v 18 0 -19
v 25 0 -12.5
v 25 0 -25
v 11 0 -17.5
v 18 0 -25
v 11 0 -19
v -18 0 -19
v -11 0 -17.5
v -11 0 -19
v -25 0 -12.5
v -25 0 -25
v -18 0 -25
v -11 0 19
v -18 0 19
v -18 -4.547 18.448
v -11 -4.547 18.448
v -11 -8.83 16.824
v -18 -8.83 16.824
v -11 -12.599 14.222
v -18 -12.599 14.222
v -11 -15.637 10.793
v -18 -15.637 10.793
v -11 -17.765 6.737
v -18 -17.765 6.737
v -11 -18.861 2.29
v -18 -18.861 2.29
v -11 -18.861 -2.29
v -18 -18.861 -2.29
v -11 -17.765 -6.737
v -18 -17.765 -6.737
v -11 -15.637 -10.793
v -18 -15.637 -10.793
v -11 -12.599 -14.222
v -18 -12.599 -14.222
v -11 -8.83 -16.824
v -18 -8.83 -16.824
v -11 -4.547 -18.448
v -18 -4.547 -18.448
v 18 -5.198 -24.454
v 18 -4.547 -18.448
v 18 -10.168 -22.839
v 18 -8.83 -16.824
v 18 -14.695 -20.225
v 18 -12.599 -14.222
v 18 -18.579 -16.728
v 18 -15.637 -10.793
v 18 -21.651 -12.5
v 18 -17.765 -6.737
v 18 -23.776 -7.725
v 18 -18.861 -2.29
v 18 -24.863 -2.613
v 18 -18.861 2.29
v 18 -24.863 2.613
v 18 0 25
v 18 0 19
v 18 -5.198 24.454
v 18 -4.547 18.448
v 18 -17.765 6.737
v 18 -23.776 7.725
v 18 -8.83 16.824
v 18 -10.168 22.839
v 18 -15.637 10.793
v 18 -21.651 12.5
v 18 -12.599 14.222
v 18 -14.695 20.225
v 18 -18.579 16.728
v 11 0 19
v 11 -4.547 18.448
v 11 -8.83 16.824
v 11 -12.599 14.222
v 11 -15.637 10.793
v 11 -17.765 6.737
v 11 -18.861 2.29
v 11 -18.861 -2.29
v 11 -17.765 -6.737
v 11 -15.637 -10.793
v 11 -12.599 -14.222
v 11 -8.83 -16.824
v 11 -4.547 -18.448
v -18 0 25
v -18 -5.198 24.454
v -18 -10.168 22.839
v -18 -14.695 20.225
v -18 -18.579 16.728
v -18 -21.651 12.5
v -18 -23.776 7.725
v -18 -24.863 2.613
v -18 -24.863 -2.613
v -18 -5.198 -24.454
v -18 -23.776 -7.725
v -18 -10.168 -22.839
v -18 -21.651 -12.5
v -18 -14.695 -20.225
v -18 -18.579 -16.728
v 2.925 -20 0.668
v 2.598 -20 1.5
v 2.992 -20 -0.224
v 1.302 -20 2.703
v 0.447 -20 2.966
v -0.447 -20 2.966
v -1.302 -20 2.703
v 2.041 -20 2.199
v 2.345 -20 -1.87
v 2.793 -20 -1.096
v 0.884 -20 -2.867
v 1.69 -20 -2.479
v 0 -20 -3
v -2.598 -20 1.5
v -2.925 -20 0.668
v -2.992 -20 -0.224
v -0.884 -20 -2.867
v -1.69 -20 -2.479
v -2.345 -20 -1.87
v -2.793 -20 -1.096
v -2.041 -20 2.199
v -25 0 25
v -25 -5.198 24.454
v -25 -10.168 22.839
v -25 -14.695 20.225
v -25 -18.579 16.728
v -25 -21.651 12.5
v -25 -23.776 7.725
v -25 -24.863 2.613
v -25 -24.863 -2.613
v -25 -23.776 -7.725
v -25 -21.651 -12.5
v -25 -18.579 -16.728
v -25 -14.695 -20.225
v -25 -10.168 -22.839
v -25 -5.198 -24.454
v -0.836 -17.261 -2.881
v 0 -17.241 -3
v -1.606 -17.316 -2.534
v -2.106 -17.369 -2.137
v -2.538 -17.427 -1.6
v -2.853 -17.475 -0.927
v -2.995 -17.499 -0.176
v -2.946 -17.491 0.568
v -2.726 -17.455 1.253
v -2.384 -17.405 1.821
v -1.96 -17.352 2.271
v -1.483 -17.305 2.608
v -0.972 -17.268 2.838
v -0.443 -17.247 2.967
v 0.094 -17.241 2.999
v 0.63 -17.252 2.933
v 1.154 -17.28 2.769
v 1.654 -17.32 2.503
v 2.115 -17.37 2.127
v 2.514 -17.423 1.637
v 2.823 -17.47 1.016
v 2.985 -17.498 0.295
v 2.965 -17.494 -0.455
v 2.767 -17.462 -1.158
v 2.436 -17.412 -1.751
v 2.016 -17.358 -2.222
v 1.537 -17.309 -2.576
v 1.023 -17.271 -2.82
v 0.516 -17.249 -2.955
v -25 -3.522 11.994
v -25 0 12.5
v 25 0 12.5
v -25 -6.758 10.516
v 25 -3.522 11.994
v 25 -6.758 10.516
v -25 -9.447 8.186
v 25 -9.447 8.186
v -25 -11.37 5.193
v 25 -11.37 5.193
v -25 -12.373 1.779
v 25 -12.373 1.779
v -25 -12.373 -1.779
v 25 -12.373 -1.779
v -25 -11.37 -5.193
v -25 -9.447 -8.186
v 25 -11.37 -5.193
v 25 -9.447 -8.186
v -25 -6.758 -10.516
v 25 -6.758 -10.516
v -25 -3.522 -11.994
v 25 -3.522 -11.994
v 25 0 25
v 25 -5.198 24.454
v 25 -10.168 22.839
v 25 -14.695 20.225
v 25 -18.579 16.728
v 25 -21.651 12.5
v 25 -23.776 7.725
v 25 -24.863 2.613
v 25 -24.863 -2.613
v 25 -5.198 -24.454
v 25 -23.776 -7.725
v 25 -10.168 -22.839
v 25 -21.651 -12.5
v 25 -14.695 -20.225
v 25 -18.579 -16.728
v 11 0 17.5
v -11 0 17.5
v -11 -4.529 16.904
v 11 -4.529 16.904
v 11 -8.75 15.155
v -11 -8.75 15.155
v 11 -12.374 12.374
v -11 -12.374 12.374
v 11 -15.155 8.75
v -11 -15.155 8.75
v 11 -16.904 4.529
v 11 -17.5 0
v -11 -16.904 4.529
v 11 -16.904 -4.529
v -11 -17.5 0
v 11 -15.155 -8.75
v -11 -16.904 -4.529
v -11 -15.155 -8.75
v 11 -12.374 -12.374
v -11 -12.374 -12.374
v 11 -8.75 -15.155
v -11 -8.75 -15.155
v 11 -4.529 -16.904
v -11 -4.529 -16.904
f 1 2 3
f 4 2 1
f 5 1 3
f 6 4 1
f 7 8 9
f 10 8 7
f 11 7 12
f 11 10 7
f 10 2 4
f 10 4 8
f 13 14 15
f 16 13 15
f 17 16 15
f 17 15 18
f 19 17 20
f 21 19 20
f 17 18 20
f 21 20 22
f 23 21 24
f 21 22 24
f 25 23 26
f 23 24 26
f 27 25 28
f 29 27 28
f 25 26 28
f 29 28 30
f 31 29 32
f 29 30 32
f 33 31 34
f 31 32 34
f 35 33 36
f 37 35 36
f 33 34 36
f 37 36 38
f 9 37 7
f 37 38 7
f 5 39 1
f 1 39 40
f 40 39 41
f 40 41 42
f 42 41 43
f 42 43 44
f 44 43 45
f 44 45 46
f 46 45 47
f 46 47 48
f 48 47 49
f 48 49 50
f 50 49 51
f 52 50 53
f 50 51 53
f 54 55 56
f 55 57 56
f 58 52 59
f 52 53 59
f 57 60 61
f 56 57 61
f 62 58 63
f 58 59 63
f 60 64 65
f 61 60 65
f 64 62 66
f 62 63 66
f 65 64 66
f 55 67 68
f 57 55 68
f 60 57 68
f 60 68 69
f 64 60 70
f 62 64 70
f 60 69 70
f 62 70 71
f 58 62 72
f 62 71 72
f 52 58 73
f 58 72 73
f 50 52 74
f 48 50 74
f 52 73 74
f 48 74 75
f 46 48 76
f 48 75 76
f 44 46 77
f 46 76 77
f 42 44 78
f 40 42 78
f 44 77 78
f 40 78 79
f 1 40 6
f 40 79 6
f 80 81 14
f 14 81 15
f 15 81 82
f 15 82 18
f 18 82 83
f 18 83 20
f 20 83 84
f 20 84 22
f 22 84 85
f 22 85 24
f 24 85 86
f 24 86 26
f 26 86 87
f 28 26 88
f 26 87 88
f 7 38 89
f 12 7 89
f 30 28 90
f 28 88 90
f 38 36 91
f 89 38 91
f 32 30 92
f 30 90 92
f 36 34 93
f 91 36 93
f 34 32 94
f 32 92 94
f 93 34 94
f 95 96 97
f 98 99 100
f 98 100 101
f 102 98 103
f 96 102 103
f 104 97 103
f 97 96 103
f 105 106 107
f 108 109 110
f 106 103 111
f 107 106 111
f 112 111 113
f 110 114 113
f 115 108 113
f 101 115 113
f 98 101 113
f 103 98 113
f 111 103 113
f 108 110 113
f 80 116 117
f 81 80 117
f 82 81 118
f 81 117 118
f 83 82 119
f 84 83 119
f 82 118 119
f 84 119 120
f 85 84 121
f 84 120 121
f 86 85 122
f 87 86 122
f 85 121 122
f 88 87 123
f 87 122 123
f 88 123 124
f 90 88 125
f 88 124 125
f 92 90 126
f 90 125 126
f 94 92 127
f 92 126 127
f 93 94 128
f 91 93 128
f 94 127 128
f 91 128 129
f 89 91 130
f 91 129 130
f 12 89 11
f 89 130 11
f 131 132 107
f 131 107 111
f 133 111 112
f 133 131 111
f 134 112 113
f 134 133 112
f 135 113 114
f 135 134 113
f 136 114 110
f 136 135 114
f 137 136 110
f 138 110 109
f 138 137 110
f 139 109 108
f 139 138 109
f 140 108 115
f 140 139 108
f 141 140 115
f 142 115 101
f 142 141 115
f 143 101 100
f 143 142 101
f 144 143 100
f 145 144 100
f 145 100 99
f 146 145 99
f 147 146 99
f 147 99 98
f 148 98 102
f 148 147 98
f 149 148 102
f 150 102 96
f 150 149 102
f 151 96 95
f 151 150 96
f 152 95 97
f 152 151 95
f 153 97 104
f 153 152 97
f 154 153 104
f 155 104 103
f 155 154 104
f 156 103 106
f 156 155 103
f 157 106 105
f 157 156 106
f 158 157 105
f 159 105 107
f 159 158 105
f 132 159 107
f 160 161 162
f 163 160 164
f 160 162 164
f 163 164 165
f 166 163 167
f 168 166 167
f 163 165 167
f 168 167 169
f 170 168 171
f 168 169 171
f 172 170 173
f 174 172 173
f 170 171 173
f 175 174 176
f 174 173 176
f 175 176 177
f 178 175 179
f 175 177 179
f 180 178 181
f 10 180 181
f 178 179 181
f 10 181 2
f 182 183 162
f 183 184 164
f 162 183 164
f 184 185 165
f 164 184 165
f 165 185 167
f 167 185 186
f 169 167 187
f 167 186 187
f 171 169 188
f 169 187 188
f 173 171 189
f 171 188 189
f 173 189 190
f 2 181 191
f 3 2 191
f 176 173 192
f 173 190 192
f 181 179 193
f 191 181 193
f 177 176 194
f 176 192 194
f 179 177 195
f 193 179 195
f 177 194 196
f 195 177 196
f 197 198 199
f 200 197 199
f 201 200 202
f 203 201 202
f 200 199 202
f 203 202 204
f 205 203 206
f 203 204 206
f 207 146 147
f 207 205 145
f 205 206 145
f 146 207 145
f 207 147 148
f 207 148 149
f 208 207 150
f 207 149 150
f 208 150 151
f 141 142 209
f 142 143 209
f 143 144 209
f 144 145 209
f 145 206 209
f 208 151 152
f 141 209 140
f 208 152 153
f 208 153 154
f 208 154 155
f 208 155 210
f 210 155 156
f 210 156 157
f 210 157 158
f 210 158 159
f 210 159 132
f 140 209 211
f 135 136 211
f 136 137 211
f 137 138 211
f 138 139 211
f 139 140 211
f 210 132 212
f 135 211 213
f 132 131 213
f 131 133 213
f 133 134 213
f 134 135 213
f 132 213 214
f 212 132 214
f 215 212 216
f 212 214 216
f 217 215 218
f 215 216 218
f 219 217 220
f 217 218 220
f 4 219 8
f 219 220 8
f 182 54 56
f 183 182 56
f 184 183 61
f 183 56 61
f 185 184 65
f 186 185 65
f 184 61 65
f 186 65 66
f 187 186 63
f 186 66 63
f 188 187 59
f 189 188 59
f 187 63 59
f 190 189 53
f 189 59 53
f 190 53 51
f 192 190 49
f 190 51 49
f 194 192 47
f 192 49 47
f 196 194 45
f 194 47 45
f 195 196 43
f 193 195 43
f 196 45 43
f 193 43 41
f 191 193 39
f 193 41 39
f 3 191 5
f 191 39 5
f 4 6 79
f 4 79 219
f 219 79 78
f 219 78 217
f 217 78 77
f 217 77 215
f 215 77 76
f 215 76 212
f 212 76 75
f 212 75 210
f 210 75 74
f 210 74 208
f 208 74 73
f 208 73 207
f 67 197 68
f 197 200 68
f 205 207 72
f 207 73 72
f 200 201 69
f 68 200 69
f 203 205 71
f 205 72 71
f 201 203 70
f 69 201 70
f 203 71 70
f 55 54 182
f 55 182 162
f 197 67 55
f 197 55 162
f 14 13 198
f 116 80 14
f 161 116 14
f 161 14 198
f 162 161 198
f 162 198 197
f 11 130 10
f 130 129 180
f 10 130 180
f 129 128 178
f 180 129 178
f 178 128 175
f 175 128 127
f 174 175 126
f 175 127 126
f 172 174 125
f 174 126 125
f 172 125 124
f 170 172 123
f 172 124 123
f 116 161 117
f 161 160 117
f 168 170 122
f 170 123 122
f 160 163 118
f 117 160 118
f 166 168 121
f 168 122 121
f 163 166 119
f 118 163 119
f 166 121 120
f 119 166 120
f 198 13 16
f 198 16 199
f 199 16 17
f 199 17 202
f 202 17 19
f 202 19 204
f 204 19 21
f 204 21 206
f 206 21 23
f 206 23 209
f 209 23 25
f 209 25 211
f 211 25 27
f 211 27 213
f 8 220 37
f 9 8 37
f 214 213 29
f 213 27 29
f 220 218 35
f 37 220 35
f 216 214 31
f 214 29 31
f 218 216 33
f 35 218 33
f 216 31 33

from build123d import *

# Parameters (mm, degrees)
SKETCH2_R               = 12.5
CUT_EXTRUDE1_DEPTH      = 62.23724357
CUT_EXTRUDE4_DEPTH      = 62.23724357
CUT_EXTRUDE4_DEPTH_BACK = 62.23724357
SKETCH5_R               = 3
BOSS_EXTRUDE1_DEPTH     = 2.5


with BuildPart() as part:
    # Sketch1 → Revolve1 (revolve)
    with BuildSketch(Plane.XY, mode=Mode.PRIVATE) as revolve1_sk:
        Polygon((-25, 0), (25, 0), (25, 25), (18, 25), (18, 19), (11, 19), (11, 17.5), (-11, 17.5), (-11, 19), (-18, 19), (-18, 25), (-25, 25), align=None)
    revolve(revolve1_sk.sketch.rotate(Axis((-25, 0, 0), (1, 0, 0)), 90), axis=Axis((-25, 0, 0), (1, 0, 0)))

    # Sketch2 → Cut-Extrude1 (cut, through all)
    with BuildSketch(Plane(origin=(25, 0, 0), x_dir=(0, 0, -1), z_dir=(1, 0, 0))):
        Circle(SKETCH2_R)
    extrude(amount=-CUT_EXTRUDE1_DEPTH, mode=Mode.SUBTRACT)

    # Sketch3 → Cut-Extrude4 (cut, two sides: drawn at the far end of the back side and taken through both)
    with BuildSketch(Plane(origin=(25, 0, 0), x_dir=(0, 0, -1), z_dir=(1, 0, 0)).offset(-CUT_EXTRUDE4_DEPTH_BACK)):
        Polygon((-146.803398875, 0), (-25, 0), (25, 0), (146.803398875, 0), (146.803398875, 243.60679775), (-146.803398875, 243.60679775), align=None)
    extrude(amount=CUT_EXTRUDE4_DEPTH + CUT_EXTRUDE4_DEPTH_BACK, mode=Mode.SUBTRACT)

    # Sketch5 → Boss-Extrude1 (add, symmetric)
    with BuildSketch(Plane(origin=(0, -17.5, 0), x_dir=(1, 0, 0), z_dir=(0, 1, 0))):
        with Locations(Location((0, 0, 0), (0, 0, 90))):
            Circle(SKETCH5_R)
    extrude(amount=BOSS_EXTRUDE1_DEPTH, both=True)


solid = part.part
